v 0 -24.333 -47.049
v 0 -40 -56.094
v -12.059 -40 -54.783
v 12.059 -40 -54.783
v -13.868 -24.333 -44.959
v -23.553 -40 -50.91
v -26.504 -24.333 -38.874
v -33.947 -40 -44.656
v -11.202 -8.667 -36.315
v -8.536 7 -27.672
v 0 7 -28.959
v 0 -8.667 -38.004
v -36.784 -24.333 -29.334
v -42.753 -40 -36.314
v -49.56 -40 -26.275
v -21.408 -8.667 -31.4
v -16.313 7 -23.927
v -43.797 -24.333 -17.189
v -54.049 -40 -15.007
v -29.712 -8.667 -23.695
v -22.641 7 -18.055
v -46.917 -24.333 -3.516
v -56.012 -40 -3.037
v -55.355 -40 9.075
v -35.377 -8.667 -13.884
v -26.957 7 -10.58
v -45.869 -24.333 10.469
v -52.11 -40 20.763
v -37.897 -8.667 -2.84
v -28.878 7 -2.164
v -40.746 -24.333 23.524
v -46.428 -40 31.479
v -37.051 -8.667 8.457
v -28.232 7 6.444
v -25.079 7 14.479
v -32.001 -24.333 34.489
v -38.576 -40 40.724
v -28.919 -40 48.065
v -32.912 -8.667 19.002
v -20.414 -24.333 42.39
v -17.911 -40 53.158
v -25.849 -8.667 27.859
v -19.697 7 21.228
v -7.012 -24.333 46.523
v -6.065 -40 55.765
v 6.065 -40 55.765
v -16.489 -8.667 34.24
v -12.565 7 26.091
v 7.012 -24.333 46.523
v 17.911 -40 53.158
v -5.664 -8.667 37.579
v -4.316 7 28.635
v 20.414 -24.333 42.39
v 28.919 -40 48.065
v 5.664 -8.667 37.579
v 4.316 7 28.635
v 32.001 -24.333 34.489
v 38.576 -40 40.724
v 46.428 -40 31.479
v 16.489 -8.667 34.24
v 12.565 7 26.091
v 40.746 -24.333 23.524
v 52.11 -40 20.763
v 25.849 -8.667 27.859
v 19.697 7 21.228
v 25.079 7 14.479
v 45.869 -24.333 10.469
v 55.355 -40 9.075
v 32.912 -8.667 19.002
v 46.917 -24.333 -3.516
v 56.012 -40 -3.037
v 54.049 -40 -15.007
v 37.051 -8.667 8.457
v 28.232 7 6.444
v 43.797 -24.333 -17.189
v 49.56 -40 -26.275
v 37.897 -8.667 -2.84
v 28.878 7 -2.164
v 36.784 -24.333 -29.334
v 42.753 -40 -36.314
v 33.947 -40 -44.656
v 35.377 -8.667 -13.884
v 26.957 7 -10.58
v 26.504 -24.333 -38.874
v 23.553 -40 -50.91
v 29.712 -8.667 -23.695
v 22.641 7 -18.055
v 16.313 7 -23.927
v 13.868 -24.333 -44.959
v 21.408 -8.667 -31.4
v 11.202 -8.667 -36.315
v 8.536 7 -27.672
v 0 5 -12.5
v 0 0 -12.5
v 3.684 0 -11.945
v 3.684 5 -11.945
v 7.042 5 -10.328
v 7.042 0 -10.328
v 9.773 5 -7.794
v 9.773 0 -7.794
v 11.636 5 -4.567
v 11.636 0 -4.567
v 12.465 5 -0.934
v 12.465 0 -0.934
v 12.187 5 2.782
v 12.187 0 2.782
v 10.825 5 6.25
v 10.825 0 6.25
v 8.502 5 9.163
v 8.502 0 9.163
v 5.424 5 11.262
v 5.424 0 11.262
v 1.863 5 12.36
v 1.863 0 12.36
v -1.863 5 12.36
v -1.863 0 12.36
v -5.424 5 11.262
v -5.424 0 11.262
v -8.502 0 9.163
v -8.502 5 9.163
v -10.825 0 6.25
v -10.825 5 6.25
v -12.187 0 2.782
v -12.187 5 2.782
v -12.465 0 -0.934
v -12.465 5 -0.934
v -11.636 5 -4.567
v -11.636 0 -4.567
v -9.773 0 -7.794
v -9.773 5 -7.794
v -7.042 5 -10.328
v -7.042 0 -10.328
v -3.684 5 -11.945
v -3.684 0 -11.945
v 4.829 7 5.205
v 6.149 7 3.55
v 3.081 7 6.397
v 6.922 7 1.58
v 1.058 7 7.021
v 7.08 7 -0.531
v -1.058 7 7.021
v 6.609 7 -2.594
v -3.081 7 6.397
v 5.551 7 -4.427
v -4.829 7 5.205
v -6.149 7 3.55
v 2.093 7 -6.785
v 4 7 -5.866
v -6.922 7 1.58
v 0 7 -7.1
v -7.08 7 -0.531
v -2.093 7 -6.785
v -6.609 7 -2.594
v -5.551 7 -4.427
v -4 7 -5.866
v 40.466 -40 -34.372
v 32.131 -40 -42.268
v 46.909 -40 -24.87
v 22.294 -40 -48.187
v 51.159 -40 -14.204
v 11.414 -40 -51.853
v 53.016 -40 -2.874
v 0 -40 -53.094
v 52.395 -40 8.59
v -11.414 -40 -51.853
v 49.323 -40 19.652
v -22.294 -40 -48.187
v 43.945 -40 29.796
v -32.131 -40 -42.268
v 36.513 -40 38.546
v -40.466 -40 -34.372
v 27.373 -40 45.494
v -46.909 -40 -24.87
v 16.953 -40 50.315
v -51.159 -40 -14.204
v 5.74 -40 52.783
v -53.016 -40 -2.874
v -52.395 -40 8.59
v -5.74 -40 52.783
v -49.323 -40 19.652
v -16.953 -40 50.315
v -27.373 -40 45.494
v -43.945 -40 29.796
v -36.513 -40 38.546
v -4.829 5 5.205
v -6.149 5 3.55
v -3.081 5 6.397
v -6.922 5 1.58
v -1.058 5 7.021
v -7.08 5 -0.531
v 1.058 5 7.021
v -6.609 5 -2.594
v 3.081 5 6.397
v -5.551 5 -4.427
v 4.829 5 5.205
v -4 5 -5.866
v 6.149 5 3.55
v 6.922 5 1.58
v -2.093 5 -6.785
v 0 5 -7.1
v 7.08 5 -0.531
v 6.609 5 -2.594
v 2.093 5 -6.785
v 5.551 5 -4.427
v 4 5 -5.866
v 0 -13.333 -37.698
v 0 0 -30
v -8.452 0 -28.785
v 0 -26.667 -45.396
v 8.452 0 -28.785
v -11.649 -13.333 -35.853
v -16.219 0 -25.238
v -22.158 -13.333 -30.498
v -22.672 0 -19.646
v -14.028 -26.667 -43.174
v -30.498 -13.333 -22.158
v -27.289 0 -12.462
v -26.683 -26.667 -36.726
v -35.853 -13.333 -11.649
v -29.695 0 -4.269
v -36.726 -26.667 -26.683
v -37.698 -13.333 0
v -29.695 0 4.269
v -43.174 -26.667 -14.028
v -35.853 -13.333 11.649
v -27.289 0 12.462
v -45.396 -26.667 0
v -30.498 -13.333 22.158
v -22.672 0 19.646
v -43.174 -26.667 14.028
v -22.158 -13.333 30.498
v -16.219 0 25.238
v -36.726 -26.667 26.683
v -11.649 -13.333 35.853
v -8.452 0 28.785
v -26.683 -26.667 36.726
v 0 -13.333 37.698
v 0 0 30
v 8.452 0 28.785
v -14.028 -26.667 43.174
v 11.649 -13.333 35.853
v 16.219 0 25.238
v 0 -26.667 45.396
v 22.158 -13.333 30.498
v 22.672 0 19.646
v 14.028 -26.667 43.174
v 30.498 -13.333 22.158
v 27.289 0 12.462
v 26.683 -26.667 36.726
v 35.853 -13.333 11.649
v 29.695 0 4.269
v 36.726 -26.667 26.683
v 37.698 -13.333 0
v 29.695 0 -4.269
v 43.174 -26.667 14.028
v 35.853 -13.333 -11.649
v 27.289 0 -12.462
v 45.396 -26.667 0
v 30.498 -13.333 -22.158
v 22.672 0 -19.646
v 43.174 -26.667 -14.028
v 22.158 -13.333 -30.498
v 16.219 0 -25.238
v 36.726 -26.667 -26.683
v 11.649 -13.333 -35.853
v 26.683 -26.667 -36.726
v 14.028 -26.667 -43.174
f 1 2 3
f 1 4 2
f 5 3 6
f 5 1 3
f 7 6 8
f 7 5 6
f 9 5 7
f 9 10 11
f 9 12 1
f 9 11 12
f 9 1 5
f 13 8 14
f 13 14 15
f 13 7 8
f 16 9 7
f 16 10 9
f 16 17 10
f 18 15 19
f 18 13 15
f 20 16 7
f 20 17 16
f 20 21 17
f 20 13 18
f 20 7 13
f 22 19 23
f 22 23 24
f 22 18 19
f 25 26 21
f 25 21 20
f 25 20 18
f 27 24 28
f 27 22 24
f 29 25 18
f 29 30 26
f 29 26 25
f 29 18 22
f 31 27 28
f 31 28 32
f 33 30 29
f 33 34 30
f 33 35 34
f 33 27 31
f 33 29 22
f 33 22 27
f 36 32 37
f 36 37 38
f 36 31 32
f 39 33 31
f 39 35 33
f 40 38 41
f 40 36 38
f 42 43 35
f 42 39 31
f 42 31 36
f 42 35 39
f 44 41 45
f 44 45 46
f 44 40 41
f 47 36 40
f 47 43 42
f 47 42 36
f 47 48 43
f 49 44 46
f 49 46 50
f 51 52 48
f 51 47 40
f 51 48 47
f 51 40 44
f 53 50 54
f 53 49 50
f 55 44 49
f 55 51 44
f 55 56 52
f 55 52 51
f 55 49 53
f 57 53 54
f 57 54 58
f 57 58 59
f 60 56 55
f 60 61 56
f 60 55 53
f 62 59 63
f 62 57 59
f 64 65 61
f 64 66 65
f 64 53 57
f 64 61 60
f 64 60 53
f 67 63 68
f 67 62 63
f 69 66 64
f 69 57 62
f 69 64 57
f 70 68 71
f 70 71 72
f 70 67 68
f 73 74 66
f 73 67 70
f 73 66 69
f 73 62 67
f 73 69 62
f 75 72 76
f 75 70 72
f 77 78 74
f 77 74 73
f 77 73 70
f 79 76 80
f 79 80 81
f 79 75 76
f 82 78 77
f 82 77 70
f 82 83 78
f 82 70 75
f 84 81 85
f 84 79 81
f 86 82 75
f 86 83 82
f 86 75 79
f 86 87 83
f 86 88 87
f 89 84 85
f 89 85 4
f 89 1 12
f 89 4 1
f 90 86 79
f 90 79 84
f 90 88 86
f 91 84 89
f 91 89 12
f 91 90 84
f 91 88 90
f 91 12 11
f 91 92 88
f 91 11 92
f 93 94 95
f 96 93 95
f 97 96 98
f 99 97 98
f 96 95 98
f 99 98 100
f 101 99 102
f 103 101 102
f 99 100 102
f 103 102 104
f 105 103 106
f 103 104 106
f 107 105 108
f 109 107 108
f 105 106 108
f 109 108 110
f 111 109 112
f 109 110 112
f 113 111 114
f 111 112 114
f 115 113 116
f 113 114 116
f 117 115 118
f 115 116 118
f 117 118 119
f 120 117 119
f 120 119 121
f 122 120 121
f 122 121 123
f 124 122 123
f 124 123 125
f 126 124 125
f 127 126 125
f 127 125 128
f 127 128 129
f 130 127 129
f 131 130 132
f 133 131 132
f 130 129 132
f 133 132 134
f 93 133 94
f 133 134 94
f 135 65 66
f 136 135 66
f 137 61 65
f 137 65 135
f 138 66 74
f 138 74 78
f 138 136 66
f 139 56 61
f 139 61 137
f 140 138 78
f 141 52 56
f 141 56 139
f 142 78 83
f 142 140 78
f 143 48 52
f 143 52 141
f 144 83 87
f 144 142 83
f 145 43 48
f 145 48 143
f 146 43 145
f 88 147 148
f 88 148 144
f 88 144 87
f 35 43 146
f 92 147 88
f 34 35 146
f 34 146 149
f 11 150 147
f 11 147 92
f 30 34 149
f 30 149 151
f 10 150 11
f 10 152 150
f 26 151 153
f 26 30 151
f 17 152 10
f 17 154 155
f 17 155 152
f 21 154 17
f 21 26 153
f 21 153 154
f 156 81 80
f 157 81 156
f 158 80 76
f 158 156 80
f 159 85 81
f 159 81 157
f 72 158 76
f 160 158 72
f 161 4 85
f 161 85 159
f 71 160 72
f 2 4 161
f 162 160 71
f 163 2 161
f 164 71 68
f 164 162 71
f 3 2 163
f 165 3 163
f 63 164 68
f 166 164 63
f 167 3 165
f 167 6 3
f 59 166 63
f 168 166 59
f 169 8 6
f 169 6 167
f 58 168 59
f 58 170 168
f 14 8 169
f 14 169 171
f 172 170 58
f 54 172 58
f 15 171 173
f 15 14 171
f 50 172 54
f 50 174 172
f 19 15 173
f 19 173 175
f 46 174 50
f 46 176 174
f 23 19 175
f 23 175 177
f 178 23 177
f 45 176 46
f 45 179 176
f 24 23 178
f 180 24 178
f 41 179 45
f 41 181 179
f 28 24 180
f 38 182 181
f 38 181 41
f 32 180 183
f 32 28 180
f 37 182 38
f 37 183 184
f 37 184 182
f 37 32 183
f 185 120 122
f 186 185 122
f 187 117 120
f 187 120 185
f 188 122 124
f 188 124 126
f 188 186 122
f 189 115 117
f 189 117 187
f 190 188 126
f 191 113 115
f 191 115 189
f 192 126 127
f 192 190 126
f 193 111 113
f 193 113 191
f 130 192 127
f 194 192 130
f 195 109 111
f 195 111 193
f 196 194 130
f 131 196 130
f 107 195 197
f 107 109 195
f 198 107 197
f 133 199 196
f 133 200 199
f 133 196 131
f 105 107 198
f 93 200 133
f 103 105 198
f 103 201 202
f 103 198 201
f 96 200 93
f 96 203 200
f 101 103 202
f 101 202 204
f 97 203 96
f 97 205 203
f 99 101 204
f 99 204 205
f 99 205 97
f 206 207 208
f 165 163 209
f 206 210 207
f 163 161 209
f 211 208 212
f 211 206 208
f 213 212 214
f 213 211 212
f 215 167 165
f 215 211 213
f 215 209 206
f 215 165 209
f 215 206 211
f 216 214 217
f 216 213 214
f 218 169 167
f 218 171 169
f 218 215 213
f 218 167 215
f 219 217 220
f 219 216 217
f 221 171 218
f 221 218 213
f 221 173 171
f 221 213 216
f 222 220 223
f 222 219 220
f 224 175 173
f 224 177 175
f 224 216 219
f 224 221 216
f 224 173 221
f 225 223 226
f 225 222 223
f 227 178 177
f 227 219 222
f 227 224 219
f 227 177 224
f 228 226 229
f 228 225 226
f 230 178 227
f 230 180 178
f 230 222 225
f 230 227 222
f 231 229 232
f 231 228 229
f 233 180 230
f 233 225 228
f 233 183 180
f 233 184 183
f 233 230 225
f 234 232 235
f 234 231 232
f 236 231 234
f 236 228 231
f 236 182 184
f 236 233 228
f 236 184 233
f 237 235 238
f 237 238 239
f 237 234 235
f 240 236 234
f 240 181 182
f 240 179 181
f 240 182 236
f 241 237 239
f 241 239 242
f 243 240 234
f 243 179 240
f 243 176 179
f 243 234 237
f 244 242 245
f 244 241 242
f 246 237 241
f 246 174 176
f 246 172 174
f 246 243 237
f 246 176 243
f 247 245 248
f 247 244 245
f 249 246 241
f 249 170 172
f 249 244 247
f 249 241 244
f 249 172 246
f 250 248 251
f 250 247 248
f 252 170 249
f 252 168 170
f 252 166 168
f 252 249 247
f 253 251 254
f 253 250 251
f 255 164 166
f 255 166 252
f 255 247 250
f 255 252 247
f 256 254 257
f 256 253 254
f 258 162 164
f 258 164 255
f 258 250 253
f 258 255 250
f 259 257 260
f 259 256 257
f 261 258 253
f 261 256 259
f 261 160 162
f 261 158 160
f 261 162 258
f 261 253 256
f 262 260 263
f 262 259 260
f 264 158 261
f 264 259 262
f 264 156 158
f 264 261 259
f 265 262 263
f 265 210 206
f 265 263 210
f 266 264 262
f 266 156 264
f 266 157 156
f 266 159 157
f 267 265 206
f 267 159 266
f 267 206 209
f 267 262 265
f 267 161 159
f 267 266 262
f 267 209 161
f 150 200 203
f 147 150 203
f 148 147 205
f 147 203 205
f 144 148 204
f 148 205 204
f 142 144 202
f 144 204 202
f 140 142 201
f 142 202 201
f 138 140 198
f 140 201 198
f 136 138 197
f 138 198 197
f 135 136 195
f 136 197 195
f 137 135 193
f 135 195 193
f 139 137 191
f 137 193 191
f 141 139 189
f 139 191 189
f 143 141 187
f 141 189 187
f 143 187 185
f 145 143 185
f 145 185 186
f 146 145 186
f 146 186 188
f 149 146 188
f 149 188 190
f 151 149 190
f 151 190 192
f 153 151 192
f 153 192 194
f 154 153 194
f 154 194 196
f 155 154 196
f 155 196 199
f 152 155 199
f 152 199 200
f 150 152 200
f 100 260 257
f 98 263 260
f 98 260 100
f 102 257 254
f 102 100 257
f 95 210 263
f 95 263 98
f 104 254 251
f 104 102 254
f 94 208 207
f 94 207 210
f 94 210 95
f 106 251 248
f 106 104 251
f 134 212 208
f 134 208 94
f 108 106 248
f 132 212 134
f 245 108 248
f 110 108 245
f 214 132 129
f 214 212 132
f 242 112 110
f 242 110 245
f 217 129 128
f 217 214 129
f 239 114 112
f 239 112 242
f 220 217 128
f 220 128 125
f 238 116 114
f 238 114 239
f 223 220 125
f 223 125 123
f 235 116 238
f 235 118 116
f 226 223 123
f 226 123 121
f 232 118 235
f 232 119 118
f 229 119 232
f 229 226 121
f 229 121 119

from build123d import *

# Parameters (mm, degrees)
SKETCH_4_R          = 12.5
CUT_EXTRUDE_1_DEPTH = 5
SKETCH_5_R          = 7.1
CUT_EXTRUDE_2_DEPTH = 92.203487258


with BuildPart() as part:
    # 草图2 → 旋转1 (revolve)
    with BuildSketch(Plane.XY, mode=Mode.PRIVATE) as revolve_1_sk:
        Polygon((0, 0), (-30, 0), (-53.094010768, -40), (-56.094010768, -40), (-28.958548116, 7), (0, 7), align=None)
    revolve(revolve_1_sk.sketch.rotate(Axis((0, 0, 0), (0, 1, 0)), 270), axis=Axis((0, 0, 0), (0, 1, 0)))

    # 草图4 → 切除-拉伸1 (cut)
    with BuildSketch(Plane.XZ):
        with Locations(Location((0, 0, 0), (0, 0, 270))):
            Circle(SKETCH_4_R)
    extrude(amount=-CUT_EXTRUDE_1_DEPTH, mode=Mode.SUBTRACT)

    # 草图5 → 切除-拉伸2 (cut, through all)
    with BuildSketch(Plane.XZ.offset(-5)):
        with Locations(Location((0, 0, 0), (0, 0, 270))):
            Circle(SKETCH_5_R)
    extrude(amount=-CUT_EXTRUDE_2_DEPTH, mode=Mode.SUBTRACT)


solid = part.part
